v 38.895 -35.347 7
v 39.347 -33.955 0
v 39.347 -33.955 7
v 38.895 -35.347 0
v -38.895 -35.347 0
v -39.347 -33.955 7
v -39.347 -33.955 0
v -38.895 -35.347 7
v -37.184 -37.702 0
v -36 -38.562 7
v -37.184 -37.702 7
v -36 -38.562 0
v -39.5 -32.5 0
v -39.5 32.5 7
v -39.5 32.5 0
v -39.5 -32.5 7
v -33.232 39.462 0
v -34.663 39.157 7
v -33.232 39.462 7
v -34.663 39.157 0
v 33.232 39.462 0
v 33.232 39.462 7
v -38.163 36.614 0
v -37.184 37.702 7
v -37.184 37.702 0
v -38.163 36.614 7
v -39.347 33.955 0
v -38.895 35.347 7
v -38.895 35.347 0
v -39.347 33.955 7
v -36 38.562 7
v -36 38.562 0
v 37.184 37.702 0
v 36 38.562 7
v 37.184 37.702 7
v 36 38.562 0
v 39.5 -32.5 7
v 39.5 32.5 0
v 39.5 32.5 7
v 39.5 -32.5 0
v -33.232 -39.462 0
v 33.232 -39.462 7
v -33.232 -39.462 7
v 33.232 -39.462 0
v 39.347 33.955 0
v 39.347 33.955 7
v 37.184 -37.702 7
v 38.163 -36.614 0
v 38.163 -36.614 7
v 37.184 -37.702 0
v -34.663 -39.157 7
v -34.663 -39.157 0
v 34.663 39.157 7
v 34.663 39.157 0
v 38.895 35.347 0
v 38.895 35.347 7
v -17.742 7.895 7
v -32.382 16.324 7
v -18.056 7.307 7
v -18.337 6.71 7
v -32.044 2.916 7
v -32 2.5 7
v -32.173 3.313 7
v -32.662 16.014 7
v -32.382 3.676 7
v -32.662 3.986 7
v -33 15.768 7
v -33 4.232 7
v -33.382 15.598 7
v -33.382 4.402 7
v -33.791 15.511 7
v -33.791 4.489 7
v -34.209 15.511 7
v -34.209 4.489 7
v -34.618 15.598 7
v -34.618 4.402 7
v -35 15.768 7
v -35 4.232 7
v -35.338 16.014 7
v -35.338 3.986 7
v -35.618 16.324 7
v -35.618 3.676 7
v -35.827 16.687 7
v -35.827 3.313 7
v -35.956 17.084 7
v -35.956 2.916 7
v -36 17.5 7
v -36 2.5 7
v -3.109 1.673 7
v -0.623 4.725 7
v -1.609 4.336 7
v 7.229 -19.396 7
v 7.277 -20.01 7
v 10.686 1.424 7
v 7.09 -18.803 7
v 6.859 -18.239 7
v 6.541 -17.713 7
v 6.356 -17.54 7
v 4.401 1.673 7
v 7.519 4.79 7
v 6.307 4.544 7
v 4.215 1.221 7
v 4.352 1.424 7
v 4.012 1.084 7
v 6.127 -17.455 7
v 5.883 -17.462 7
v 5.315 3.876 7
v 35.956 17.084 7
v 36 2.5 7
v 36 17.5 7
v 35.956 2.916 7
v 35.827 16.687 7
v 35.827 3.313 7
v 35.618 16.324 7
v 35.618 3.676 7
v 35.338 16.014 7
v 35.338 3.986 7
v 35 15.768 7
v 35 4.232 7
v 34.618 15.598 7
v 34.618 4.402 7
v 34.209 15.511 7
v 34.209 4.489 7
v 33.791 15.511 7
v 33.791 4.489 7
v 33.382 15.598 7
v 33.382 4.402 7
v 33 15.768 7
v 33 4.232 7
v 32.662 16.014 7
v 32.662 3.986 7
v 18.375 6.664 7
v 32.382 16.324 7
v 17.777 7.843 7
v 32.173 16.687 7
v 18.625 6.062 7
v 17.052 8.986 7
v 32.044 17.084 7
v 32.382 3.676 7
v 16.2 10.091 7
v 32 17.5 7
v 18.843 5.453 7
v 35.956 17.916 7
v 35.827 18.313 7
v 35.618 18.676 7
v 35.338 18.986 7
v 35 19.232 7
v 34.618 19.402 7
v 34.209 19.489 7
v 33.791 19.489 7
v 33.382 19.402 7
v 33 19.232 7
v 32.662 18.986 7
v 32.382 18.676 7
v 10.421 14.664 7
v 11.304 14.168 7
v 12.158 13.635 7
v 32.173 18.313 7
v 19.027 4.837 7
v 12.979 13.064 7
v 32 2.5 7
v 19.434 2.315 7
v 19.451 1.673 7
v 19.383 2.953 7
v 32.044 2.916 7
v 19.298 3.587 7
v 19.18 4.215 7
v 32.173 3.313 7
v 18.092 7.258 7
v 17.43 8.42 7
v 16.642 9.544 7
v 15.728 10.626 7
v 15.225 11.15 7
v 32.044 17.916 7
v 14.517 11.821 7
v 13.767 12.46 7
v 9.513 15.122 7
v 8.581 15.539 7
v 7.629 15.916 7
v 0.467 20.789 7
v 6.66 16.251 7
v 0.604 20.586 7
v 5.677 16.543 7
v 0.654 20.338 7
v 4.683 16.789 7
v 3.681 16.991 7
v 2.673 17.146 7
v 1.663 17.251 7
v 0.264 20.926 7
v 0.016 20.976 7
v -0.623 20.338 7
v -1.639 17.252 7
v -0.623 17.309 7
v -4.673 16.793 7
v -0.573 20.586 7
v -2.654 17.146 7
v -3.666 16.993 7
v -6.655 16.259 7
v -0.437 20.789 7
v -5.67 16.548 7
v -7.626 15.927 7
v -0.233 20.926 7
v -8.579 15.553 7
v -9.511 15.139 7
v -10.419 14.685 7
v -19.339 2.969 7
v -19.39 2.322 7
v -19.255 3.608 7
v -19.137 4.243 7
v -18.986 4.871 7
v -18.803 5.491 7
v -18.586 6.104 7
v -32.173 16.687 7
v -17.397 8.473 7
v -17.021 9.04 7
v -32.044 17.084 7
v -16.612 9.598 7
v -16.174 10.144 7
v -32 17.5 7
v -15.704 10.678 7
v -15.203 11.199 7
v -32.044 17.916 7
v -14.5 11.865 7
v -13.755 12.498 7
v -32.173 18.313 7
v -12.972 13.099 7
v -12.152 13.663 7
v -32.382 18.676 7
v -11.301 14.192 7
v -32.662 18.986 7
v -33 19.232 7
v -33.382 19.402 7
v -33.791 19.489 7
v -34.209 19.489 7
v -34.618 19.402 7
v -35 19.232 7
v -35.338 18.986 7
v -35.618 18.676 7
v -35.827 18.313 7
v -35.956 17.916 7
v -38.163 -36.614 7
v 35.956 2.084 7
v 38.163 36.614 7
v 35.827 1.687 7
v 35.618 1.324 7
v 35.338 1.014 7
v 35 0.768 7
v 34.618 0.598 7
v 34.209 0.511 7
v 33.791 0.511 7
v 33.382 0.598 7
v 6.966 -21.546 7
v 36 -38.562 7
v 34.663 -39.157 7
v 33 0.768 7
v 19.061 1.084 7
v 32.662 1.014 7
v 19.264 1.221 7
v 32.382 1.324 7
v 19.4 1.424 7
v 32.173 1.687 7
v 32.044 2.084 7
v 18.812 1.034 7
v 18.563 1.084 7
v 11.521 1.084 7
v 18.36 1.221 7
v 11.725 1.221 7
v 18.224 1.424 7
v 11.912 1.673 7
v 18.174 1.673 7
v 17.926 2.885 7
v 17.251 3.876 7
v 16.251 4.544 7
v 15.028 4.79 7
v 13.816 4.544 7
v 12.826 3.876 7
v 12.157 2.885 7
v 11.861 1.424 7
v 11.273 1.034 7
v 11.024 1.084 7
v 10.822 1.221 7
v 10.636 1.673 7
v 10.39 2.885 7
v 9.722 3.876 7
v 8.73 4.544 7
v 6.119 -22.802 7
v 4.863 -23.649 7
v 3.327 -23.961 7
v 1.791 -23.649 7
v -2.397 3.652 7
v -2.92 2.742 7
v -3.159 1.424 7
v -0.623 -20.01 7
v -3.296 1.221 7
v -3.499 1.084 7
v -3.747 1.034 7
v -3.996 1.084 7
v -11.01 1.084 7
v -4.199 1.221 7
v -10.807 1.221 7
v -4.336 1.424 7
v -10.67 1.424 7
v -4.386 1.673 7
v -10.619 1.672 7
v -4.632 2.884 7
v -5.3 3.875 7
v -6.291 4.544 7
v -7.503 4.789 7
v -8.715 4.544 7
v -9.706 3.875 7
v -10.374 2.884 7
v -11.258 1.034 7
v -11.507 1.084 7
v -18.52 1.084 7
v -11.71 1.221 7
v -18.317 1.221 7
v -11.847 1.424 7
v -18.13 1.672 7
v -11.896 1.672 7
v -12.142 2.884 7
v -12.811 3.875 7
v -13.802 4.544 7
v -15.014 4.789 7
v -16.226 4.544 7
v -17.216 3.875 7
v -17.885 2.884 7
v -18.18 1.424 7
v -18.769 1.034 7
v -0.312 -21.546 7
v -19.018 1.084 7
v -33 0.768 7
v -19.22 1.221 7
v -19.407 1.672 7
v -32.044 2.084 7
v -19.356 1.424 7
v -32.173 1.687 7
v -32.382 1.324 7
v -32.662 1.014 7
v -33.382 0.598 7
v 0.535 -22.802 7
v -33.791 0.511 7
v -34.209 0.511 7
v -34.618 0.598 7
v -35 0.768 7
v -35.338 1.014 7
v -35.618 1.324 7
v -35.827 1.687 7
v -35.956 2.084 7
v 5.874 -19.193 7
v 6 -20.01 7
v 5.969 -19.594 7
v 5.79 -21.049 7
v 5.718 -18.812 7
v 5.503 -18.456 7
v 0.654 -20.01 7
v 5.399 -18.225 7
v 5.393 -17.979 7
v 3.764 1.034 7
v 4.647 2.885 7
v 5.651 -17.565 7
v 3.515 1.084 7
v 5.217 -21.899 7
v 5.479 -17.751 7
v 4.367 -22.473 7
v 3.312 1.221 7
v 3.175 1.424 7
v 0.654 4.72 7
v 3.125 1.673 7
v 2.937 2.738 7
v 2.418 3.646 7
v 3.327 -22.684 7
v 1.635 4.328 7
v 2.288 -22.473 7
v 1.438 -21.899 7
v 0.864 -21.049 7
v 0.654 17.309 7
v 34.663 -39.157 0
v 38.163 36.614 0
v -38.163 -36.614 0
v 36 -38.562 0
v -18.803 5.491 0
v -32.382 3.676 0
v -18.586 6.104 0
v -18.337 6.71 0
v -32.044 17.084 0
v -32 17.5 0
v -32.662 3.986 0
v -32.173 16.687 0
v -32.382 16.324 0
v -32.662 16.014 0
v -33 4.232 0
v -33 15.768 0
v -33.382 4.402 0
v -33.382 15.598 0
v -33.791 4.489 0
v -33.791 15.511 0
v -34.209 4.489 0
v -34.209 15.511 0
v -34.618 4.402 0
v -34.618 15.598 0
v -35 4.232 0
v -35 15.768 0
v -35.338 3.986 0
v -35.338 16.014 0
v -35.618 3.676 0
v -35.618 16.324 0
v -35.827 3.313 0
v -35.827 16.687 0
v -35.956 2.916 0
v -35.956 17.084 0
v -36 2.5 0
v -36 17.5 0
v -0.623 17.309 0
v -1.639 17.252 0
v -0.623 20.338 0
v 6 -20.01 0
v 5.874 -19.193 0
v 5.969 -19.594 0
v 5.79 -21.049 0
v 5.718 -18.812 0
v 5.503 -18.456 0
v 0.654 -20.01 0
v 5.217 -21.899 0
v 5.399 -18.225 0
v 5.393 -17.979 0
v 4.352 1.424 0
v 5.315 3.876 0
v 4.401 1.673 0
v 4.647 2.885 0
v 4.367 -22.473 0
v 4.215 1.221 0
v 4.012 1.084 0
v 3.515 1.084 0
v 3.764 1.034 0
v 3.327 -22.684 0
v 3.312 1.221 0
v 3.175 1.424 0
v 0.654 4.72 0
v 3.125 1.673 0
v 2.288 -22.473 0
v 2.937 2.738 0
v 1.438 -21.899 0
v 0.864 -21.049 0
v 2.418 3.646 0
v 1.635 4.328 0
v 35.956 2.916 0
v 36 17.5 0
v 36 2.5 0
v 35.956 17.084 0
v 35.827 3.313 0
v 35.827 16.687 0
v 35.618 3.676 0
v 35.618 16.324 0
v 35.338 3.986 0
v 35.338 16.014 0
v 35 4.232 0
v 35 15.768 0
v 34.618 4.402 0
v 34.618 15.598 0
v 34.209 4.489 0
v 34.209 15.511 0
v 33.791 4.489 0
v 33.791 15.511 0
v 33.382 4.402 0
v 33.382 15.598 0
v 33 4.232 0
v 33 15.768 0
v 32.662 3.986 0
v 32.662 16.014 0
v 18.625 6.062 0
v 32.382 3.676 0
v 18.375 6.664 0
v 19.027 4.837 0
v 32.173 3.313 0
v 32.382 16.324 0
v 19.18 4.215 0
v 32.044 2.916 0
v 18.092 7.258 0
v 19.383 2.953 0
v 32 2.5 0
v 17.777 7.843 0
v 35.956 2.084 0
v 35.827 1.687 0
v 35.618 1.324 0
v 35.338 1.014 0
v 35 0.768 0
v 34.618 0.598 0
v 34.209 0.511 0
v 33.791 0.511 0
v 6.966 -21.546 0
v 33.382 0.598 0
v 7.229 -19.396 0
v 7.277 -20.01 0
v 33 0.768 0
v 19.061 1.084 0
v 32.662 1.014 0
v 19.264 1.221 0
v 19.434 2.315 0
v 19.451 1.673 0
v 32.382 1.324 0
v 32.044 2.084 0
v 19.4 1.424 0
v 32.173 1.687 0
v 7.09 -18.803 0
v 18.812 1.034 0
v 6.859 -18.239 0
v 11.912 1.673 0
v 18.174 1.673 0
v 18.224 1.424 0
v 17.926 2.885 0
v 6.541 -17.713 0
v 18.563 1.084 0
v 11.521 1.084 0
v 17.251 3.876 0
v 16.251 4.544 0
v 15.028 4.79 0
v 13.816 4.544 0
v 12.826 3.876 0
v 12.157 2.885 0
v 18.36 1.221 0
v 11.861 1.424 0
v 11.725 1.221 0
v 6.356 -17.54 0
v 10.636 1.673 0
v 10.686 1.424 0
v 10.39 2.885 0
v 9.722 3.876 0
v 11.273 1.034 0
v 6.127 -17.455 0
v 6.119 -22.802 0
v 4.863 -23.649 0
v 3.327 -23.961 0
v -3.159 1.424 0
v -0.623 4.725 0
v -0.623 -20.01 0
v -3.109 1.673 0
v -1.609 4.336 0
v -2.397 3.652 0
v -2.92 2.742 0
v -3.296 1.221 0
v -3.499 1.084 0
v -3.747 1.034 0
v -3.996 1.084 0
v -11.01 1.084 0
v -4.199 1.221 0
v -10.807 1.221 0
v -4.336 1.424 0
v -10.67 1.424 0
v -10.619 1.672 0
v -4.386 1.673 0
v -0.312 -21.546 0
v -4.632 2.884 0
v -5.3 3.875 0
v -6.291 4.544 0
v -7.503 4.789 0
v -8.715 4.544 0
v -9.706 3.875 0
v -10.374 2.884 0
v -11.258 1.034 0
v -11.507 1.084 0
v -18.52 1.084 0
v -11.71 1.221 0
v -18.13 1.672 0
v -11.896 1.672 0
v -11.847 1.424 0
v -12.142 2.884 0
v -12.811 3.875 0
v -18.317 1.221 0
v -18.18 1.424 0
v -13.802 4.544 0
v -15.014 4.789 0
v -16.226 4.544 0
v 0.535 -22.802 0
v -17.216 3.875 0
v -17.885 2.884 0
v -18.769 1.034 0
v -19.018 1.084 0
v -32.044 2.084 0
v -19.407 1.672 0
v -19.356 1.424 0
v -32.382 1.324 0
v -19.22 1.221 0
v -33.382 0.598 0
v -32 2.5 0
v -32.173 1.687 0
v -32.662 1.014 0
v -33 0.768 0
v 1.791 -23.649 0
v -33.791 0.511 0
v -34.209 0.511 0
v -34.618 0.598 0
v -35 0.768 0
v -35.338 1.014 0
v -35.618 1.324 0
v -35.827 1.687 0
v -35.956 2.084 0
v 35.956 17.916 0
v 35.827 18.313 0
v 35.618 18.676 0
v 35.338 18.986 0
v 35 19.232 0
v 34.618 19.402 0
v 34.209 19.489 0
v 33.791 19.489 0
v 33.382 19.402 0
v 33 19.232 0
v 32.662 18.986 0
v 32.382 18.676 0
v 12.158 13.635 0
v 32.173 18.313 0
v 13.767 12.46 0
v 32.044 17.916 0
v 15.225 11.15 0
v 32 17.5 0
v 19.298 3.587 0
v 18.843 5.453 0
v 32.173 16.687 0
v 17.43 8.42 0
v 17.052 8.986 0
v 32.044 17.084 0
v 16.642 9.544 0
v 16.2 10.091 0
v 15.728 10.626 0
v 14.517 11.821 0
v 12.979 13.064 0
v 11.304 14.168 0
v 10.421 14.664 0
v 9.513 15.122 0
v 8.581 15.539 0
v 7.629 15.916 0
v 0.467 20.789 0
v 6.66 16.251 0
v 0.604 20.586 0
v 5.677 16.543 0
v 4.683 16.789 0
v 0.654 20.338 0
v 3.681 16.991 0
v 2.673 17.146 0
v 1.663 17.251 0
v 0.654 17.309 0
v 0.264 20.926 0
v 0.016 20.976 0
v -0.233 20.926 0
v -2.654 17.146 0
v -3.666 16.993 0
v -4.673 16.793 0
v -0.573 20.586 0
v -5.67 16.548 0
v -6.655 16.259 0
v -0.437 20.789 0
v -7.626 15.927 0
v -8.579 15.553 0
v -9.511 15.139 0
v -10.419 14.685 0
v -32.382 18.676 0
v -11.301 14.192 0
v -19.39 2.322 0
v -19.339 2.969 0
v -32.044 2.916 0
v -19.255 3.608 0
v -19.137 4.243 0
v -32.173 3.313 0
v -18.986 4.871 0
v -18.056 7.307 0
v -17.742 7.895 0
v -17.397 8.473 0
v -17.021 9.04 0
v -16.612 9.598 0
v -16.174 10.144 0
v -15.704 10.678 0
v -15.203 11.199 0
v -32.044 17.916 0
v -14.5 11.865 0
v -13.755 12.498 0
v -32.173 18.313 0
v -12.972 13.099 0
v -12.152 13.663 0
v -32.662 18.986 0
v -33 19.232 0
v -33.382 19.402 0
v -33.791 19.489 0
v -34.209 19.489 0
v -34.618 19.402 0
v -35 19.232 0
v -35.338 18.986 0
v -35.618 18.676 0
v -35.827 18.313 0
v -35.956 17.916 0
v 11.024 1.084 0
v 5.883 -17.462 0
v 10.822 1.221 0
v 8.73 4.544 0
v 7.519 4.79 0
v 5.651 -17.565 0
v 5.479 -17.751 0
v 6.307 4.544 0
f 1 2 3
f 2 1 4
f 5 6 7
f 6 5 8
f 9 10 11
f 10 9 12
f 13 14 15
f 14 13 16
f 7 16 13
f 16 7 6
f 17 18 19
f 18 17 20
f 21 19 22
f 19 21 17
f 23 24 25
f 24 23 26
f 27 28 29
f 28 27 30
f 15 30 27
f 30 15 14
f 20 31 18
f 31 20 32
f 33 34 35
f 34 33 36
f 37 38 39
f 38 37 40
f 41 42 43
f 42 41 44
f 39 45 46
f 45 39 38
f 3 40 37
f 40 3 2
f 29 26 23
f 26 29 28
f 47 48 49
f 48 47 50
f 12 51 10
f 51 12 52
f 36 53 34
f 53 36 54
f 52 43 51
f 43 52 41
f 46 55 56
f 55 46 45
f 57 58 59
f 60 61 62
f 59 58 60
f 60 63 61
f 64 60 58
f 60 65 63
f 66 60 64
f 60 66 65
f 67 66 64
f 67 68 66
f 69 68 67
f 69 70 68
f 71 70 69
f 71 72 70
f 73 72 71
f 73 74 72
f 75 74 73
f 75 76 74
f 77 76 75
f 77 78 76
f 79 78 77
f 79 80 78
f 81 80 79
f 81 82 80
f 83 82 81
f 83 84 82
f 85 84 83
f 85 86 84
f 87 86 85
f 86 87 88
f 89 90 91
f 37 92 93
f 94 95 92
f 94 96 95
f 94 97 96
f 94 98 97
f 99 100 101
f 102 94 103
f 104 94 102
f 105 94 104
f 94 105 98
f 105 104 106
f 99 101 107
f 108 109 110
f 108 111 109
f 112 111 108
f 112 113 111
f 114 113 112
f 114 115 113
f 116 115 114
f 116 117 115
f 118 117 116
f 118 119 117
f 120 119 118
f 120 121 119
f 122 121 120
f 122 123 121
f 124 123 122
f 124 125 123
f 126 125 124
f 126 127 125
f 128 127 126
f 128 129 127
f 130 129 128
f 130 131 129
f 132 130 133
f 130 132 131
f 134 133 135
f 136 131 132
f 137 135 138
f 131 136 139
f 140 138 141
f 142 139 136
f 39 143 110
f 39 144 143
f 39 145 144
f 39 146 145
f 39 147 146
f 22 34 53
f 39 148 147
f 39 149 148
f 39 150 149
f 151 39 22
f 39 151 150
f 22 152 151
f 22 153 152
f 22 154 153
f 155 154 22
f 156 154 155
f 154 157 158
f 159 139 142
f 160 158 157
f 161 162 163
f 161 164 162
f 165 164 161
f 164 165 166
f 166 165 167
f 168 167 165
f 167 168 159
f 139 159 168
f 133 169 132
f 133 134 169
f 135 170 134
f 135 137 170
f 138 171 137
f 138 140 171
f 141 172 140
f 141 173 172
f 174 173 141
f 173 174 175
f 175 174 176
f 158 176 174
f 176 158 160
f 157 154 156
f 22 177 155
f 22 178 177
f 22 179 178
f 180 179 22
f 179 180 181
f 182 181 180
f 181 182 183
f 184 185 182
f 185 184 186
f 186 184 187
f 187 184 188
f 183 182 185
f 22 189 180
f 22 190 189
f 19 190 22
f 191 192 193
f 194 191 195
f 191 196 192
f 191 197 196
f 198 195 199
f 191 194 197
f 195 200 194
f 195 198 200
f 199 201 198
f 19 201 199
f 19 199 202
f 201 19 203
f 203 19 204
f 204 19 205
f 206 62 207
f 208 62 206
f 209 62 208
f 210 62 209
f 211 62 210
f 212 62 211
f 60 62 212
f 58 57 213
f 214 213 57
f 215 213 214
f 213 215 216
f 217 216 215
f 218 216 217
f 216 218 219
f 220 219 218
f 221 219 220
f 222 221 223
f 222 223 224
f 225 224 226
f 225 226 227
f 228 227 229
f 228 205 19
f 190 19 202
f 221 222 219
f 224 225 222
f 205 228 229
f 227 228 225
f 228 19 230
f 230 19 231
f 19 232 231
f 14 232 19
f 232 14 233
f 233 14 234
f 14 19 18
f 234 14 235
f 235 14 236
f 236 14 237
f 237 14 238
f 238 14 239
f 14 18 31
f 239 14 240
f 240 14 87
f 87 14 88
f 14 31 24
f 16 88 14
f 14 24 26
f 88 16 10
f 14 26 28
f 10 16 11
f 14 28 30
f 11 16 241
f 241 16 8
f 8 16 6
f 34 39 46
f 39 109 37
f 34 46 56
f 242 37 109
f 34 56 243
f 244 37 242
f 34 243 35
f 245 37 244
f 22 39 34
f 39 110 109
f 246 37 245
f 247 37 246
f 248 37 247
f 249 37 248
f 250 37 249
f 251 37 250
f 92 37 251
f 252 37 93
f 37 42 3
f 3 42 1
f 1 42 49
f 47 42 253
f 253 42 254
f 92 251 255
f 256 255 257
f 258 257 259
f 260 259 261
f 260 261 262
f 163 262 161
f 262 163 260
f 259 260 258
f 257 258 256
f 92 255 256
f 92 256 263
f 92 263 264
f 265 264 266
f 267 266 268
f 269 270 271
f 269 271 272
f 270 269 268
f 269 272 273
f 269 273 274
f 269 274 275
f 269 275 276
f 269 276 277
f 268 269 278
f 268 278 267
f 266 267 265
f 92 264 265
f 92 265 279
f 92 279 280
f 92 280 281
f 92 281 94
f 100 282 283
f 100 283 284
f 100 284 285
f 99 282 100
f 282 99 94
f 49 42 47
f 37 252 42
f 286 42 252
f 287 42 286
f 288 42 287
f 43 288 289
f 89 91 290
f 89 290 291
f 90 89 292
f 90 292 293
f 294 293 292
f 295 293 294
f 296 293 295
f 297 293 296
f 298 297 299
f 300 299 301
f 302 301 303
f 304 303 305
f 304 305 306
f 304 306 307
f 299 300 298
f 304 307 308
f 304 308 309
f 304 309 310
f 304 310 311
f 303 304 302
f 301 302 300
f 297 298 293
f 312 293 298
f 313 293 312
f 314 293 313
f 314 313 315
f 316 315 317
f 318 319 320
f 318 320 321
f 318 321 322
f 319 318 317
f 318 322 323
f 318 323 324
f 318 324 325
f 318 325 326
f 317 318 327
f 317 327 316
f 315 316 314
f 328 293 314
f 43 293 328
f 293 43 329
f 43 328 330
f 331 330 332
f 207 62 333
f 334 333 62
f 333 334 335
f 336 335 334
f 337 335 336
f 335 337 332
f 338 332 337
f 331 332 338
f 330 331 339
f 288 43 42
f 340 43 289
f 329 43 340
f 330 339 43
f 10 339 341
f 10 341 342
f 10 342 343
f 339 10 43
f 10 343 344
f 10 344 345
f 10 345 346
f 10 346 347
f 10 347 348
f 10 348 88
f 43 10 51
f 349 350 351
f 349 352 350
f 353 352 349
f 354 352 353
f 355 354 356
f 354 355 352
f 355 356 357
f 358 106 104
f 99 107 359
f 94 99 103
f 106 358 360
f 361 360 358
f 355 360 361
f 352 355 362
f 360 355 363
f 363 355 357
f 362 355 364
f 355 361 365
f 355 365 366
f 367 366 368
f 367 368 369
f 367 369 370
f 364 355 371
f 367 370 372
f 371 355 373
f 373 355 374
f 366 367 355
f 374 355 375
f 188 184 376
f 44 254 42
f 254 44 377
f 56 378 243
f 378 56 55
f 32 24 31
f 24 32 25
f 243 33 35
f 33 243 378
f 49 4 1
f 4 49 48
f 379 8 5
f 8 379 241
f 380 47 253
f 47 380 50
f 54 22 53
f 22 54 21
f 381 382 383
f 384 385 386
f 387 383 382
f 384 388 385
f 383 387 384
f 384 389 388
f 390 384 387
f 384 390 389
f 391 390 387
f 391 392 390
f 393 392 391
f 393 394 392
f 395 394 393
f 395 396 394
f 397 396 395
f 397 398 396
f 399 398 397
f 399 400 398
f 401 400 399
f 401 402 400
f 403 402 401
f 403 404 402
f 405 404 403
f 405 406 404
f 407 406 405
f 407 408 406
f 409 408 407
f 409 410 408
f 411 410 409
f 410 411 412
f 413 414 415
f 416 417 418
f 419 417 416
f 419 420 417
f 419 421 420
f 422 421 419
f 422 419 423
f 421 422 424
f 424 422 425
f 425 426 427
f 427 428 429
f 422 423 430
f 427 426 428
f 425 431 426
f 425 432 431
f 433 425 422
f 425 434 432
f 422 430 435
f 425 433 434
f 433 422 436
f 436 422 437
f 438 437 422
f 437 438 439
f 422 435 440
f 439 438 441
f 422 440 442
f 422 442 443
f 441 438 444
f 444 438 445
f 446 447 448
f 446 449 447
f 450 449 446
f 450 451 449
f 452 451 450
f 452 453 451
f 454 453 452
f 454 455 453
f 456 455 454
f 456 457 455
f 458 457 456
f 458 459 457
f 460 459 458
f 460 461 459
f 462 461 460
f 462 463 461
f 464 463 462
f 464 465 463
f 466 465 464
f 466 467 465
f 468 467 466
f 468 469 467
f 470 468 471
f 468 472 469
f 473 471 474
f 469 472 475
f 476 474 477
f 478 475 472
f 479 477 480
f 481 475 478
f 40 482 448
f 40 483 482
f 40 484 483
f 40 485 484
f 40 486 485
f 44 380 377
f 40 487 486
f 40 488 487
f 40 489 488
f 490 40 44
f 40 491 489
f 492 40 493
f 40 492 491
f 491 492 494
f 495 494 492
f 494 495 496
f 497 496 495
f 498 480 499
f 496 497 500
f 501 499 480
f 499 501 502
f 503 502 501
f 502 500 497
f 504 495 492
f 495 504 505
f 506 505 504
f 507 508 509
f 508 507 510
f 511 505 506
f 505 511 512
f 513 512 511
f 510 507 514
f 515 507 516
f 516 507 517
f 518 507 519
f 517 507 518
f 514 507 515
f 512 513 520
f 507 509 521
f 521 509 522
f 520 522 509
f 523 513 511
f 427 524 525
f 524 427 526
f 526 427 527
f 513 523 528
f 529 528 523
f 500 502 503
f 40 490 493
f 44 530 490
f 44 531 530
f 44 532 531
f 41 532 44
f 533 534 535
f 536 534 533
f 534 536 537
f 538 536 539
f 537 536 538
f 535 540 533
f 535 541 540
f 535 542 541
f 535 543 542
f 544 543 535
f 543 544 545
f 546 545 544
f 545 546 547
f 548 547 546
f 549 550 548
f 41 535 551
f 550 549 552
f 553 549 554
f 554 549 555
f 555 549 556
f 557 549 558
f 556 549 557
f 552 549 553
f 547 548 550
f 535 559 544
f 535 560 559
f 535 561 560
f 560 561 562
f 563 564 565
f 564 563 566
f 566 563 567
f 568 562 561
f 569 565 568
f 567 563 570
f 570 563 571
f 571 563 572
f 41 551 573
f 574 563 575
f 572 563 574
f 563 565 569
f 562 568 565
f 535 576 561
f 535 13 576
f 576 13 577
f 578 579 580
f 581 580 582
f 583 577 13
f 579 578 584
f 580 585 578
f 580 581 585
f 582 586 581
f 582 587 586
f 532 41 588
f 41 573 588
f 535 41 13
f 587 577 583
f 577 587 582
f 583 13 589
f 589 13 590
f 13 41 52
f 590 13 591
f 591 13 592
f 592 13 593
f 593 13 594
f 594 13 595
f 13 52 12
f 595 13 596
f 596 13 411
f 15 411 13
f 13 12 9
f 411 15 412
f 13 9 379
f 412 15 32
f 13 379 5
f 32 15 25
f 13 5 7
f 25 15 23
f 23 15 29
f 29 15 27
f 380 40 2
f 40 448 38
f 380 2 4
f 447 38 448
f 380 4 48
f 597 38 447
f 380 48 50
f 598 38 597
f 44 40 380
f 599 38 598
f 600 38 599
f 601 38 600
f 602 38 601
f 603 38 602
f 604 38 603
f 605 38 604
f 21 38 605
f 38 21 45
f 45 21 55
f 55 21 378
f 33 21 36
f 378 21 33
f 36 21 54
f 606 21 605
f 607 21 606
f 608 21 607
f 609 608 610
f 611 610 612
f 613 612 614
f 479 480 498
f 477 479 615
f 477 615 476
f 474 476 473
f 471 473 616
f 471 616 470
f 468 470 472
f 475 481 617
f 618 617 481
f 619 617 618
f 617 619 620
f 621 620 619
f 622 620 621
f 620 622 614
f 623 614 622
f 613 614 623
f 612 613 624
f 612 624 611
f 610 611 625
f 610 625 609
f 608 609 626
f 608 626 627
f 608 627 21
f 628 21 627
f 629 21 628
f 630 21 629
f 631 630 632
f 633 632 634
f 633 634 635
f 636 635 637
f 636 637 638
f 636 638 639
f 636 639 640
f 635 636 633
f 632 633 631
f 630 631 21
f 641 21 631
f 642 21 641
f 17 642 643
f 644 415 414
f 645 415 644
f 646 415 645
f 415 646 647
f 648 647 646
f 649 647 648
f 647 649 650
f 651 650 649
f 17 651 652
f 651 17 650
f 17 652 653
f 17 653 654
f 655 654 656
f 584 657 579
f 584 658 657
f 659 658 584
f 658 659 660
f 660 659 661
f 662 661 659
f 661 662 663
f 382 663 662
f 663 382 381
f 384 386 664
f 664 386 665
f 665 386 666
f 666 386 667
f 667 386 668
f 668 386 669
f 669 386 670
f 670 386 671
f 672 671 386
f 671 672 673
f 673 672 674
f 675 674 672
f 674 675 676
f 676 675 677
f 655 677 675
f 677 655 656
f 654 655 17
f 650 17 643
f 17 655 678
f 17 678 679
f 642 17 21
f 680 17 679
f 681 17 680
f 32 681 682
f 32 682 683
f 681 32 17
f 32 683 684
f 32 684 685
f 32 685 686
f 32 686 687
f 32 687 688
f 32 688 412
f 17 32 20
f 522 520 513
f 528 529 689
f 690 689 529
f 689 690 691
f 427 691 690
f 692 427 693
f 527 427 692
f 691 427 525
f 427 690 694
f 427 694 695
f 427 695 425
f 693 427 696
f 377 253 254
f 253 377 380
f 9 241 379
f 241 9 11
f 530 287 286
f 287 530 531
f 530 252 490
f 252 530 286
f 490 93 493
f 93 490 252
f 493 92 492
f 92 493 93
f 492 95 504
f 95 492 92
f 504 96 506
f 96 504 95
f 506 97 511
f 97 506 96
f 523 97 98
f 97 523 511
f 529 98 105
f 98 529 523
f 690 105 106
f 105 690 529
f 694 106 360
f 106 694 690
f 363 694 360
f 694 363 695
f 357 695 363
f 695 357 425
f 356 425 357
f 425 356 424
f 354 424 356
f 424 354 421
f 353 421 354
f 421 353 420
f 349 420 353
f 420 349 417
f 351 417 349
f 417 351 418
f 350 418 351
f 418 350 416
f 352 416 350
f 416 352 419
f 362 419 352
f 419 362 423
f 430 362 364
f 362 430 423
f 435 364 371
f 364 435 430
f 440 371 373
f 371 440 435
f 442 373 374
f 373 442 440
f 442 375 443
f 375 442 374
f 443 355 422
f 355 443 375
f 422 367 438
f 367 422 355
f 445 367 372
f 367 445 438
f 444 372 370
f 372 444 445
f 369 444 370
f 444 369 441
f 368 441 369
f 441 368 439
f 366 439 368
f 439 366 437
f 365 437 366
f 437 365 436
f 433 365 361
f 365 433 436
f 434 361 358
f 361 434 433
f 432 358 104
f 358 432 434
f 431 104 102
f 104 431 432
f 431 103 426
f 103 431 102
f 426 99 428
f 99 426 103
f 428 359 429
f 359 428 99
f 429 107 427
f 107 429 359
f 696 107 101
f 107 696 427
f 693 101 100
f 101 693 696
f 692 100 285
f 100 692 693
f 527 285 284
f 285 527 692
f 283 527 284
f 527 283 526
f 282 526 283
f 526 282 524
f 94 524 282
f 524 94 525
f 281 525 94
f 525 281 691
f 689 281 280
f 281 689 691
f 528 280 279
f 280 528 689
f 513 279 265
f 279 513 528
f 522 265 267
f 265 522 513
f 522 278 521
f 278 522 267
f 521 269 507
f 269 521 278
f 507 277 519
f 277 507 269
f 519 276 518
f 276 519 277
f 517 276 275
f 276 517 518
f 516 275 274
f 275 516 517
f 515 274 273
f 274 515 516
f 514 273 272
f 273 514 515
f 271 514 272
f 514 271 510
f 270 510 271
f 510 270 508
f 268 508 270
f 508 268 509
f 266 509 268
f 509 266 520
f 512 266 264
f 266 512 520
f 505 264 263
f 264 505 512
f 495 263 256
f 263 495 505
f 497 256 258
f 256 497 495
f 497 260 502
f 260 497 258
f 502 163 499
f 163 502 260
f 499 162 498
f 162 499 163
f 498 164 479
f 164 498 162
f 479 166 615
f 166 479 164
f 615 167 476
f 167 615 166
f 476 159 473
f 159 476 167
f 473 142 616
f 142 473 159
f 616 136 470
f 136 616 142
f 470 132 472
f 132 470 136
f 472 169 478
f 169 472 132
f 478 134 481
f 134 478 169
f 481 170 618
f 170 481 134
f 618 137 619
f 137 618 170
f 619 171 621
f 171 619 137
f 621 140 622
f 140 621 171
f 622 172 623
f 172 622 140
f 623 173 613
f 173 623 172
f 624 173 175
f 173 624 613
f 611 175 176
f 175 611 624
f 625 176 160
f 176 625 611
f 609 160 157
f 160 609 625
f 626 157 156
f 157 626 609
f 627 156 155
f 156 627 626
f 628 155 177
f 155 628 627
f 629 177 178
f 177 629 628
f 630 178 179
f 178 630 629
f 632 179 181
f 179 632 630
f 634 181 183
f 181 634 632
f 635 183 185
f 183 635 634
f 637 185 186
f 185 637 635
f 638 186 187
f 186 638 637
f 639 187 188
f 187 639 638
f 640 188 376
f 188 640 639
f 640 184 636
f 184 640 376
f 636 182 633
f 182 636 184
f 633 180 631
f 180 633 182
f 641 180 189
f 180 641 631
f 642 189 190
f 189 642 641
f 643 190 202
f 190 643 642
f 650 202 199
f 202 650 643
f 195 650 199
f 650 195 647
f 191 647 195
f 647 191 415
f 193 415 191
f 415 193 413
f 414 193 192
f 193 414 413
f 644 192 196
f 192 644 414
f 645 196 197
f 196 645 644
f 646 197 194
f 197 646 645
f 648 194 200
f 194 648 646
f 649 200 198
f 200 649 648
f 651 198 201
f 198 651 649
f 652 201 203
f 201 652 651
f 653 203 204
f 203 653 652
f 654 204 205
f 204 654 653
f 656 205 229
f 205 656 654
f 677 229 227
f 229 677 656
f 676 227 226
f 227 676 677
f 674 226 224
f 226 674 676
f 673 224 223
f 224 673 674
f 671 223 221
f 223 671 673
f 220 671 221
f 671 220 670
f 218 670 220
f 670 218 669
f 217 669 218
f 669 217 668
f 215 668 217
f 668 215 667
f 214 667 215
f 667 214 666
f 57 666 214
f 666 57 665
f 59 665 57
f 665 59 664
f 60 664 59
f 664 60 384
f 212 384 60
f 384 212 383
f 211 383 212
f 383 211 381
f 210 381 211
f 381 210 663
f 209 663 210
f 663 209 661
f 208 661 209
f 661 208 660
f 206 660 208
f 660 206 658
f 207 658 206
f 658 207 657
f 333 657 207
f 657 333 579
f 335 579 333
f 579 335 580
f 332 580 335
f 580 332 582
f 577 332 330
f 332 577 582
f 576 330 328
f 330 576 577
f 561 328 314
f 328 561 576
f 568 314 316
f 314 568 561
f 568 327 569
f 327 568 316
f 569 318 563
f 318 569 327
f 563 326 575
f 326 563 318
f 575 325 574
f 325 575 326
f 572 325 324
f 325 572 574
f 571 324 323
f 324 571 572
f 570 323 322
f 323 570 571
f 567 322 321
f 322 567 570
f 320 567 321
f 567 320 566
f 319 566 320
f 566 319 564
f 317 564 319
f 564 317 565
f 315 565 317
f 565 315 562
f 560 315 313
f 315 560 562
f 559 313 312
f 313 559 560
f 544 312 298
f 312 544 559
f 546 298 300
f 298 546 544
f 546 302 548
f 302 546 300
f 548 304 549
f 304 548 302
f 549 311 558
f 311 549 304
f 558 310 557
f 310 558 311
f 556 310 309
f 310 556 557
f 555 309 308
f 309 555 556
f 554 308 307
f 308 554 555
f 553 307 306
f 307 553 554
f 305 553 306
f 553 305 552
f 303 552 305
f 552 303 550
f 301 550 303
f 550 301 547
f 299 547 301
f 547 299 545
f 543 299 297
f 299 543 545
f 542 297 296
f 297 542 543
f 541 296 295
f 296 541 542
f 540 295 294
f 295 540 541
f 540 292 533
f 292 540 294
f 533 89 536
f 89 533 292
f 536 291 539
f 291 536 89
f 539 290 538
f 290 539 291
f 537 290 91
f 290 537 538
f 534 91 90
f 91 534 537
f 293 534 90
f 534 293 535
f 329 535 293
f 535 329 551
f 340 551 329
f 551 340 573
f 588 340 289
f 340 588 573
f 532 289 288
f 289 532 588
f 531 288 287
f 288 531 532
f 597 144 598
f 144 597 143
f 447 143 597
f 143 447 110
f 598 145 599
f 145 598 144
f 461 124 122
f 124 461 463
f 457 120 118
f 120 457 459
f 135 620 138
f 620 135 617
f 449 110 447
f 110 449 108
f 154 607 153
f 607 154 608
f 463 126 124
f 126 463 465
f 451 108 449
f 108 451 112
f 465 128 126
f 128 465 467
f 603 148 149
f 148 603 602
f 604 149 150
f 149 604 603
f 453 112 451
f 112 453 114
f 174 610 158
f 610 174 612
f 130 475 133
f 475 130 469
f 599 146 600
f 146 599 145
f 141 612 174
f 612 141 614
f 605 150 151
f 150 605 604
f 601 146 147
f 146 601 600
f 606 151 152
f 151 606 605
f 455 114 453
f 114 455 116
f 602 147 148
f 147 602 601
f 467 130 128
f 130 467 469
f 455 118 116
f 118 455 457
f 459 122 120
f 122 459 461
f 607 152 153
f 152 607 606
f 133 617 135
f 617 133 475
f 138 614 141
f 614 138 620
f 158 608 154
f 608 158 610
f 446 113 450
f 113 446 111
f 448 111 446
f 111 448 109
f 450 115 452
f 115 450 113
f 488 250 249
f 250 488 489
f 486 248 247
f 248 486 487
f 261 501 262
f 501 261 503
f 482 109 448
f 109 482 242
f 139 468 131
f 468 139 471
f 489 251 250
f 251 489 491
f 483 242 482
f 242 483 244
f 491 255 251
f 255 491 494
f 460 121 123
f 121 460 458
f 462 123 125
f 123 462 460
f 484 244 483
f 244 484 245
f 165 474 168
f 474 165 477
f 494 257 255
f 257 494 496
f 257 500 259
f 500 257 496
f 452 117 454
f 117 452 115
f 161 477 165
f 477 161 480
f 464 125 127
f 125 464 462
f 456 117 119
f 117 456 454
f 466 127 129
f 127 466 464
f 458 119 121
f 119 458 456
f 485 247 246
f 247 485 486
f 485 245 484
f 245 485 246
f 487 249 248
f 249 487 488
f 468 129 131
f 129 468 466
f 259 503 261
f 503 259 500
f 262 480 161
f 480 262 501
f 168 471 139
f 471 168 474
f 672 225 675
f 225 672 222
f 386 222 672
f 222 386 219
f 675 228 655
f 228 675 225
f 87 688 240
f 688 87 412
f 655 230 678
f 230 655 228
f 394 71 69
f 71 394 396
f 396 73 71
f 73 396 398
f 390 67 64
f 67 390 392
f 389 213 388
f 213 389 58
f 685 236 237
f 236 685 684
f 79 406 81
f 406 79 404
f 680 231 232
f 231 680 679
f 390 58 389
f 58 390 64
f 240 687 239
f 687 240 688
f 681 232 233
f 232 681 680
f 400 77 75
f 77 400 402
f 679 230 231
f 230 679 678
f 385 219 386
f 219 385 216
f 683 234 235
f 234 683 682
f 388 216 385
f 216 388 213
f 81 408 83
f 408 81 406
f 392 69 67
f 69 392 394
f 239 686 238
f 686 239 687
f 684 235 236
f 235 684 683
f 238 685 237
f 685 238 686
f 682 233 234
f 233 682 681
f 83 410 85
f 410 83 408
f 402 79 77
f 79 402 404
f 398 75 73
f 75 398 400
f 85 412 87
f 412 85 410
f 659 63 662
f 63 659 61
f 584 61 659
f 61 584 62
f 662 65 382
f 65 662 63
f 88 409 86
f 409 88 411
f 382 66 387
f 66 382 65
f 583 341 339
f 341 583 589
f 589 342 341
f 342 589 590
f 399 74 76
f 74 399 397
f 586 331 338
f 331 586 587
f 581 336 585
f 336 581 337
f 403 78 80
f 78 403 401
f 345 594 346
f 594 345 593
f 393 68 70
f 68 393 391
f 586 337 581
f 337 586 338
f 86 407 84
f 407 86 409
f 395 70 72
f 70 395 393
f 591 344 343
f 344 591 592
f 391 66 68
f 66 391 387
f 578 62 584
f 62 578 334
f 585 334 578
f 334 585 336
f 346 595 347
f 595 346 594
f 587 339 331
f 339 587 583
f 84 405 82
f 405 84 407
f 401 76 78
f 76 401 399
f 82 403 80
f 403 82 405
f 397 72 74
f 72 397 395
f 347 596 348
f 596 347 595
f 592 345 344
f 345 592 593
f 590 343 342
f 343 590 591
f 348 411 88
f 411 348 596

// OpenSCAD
// file: roundedRect.scad
module roundedRect(size, radius)
{
x = size[0];
y = size[1];
z = size[2];

linear_extrude(height=z)
hull()
{
// place 4 circles in the corners, with the given radius
translate([(-x/2)+(radius/2), (-y/2)+(radius/2), 0])
circle(r=radius);

translate([(x/2)-(radius/2), (-y/2)+(radius/2), 0])
circle(r=radius);

translate([(-x/2)+(radius/2), (y/2)-(radius/2), 0])
circle(r=radius);

translate([(x/2)-(radius/2), (y/2)-(radius/2), 0])
circle(r=radius);
}
}
// main file
use <roundedRect.scad>
use <MCAD/materials.scad>


$fn=30;

module bobina(){
translate([-27.5,10,40]){
	rotate([0,90,0]){
		translate([0,0,-12.5]){
			cylinder(r=6,h=80);
		}
		difference(){
			cylinder(r=27.5,h=55);
			cylinder(r=9,h=55);
		}
		}
	}
}
 
module base(){

difference(){
roundedRect([72,72,7],7);
translate([-21,-25,0]){
	linear_extrude(height=10) import("logo_garoa.dxf", layer="guardachuva");
}
	translate([34,17.5,0]){
	cylinder(r=2,h=9);
}
	translate([34,2.5,0]){
	cylinder(r=2,h=9);
}

	translate([-34,17.5,0]){
	cylinder(r=2,h=9);
}
	translate([-34,2.5,0]){
	cylinder(r=2,h=9);
}

}
}

module support(){
	

	translate([30.5,10,24]){
		suporteLateral();
	}
	translate([-37.5,10,24]){
		suporteLateral();
	}

}
module suporteLateral(){
	rotate([0,90,0]){
		translate([-4.5,0,0]){
			difference(){	
				roundedRect([36,27,7],7);
				translate([-11.5,0,0]){
					cylinder(r=6,h=72);
				}
				translate([11.5,5,0]){
					furos();
				}	
				translate([11.5,-10,0]){
					furos();
				}				
			}
		}
	}
}

module furos(){
		translate([0,2.5,3.5]){
			rotate([0,90,0]){
				cylinder(r=2,h=20);
			}
		}

		translate([3,-0.7,0]){
			cube([3,5.5,7],7);
		}
}

translate([0,0,0]){
	rotate([0,-90,0]){
		//suporteLateral();
	}
}
union(){
translate([0,0,-0.1]){
//support();
}
base();
}
//bobina();
